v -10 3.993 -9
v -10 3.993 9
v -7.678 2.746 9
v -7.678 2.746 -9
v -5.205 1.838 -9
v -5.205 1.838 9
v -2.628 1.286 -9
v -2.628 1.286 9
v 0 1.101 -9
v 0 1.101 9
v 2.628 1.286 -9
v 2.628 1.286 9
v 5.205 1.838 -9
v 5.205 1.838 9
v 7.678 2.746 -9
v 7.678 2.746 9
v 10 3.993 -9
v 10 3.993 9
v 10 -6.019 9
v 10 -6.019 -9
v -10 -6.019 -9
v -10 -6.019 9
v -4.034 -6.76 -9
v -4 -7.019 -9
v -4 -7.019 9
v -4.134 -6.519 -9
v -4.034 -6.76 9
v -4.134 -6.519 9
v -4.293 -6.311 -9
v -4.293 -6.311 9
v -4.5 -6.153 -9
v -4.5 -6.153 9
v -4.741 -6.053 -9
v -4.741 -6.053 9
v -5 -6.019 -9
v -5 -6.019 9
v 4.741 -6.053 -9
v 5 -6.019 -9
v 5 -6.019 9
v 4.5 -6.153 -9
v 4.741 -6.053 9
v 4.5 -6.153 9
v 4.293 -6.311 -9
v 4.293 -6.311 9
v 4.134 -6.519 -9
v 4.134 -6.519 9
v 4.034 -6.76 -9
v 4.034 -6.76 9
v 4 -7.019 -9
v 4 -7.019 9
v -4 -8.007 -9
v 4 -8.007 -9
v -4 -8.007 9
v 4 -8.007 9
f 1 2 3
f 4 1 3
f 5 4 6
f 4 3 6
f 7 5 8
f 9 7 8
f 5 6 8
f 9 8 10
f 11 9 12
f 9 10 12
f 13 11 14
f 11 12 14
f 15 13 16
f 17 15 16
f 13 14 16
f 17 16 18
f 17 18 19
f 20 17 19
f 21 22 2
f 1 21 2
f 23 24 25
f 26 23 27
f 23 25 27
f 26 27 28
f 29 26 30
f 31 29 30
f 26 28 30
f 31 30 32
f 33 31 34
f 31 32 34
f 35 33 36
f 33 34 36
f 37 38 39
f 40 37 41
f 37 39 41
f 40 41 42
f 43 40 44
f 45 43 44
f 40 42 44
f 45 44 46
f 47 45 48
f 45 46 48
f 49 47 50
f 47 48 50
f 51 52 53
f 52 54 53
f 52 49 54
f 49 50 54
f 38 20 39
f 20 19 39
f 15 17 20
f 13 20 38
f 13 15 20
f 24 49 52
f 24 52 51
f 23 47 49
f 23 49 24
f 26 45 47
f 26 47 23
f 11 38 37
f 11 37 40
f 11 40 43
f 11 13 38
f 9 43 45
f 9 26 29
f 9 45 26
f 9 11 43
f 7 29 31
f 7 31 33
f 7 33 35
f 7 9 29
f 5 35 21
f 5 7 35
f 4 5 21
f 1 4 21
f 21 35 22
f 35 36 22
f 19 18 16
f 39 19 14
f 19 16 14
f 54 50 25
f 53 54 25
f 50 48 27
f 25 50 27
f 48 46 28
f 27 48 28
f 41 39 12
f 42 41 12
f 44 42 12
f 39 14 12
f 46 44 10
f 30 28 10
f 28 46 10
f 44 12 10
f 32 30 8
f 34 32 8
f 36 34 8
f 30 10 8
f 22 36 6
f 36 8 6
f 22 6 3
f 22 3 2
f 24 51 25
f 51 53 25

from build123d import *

# Parameters (mm, degrees)
BOSS_EXTRUDE1_DEPTH = 9


with BuildPart() as part:
    # Sketch1 → Boss-Extrude1 (new, symmetric)
    with BuildSketch(Plane.XY):
        with BuildLine():
            Line((10, 3.992849301), (10, -6.01853916))
            Line((10, -6.01853916), (5, -6.01853916))
            ThreePointArc((5, -6.01853916), (4.292893219, -6.311432379), (4, -7.01853916))
            Line((4, -7.01853916), (4, -8.007150699))
            Line((4, -8.007150699), (-4, -8.007150699))
            Line((-4, -8.007150699), (-4, -7.01853916))
            ThreePointArc((-4, -7.01853916), (-4.292893219, -6.311432379), (-5, -6.01853916))
            Line((-5, -6.01853916), (-10, -6.01853916))
            Line((-10, -6.01853916), (-10, 3.992849301))
            ThreePointArc((-10, 3.992849301), (0, 1.100511346), (10, 3.992849301))
        make_face()
    extrude(amount=BOSS_EXTRUDE1_DEPTH, both=True)


solid = part.part
